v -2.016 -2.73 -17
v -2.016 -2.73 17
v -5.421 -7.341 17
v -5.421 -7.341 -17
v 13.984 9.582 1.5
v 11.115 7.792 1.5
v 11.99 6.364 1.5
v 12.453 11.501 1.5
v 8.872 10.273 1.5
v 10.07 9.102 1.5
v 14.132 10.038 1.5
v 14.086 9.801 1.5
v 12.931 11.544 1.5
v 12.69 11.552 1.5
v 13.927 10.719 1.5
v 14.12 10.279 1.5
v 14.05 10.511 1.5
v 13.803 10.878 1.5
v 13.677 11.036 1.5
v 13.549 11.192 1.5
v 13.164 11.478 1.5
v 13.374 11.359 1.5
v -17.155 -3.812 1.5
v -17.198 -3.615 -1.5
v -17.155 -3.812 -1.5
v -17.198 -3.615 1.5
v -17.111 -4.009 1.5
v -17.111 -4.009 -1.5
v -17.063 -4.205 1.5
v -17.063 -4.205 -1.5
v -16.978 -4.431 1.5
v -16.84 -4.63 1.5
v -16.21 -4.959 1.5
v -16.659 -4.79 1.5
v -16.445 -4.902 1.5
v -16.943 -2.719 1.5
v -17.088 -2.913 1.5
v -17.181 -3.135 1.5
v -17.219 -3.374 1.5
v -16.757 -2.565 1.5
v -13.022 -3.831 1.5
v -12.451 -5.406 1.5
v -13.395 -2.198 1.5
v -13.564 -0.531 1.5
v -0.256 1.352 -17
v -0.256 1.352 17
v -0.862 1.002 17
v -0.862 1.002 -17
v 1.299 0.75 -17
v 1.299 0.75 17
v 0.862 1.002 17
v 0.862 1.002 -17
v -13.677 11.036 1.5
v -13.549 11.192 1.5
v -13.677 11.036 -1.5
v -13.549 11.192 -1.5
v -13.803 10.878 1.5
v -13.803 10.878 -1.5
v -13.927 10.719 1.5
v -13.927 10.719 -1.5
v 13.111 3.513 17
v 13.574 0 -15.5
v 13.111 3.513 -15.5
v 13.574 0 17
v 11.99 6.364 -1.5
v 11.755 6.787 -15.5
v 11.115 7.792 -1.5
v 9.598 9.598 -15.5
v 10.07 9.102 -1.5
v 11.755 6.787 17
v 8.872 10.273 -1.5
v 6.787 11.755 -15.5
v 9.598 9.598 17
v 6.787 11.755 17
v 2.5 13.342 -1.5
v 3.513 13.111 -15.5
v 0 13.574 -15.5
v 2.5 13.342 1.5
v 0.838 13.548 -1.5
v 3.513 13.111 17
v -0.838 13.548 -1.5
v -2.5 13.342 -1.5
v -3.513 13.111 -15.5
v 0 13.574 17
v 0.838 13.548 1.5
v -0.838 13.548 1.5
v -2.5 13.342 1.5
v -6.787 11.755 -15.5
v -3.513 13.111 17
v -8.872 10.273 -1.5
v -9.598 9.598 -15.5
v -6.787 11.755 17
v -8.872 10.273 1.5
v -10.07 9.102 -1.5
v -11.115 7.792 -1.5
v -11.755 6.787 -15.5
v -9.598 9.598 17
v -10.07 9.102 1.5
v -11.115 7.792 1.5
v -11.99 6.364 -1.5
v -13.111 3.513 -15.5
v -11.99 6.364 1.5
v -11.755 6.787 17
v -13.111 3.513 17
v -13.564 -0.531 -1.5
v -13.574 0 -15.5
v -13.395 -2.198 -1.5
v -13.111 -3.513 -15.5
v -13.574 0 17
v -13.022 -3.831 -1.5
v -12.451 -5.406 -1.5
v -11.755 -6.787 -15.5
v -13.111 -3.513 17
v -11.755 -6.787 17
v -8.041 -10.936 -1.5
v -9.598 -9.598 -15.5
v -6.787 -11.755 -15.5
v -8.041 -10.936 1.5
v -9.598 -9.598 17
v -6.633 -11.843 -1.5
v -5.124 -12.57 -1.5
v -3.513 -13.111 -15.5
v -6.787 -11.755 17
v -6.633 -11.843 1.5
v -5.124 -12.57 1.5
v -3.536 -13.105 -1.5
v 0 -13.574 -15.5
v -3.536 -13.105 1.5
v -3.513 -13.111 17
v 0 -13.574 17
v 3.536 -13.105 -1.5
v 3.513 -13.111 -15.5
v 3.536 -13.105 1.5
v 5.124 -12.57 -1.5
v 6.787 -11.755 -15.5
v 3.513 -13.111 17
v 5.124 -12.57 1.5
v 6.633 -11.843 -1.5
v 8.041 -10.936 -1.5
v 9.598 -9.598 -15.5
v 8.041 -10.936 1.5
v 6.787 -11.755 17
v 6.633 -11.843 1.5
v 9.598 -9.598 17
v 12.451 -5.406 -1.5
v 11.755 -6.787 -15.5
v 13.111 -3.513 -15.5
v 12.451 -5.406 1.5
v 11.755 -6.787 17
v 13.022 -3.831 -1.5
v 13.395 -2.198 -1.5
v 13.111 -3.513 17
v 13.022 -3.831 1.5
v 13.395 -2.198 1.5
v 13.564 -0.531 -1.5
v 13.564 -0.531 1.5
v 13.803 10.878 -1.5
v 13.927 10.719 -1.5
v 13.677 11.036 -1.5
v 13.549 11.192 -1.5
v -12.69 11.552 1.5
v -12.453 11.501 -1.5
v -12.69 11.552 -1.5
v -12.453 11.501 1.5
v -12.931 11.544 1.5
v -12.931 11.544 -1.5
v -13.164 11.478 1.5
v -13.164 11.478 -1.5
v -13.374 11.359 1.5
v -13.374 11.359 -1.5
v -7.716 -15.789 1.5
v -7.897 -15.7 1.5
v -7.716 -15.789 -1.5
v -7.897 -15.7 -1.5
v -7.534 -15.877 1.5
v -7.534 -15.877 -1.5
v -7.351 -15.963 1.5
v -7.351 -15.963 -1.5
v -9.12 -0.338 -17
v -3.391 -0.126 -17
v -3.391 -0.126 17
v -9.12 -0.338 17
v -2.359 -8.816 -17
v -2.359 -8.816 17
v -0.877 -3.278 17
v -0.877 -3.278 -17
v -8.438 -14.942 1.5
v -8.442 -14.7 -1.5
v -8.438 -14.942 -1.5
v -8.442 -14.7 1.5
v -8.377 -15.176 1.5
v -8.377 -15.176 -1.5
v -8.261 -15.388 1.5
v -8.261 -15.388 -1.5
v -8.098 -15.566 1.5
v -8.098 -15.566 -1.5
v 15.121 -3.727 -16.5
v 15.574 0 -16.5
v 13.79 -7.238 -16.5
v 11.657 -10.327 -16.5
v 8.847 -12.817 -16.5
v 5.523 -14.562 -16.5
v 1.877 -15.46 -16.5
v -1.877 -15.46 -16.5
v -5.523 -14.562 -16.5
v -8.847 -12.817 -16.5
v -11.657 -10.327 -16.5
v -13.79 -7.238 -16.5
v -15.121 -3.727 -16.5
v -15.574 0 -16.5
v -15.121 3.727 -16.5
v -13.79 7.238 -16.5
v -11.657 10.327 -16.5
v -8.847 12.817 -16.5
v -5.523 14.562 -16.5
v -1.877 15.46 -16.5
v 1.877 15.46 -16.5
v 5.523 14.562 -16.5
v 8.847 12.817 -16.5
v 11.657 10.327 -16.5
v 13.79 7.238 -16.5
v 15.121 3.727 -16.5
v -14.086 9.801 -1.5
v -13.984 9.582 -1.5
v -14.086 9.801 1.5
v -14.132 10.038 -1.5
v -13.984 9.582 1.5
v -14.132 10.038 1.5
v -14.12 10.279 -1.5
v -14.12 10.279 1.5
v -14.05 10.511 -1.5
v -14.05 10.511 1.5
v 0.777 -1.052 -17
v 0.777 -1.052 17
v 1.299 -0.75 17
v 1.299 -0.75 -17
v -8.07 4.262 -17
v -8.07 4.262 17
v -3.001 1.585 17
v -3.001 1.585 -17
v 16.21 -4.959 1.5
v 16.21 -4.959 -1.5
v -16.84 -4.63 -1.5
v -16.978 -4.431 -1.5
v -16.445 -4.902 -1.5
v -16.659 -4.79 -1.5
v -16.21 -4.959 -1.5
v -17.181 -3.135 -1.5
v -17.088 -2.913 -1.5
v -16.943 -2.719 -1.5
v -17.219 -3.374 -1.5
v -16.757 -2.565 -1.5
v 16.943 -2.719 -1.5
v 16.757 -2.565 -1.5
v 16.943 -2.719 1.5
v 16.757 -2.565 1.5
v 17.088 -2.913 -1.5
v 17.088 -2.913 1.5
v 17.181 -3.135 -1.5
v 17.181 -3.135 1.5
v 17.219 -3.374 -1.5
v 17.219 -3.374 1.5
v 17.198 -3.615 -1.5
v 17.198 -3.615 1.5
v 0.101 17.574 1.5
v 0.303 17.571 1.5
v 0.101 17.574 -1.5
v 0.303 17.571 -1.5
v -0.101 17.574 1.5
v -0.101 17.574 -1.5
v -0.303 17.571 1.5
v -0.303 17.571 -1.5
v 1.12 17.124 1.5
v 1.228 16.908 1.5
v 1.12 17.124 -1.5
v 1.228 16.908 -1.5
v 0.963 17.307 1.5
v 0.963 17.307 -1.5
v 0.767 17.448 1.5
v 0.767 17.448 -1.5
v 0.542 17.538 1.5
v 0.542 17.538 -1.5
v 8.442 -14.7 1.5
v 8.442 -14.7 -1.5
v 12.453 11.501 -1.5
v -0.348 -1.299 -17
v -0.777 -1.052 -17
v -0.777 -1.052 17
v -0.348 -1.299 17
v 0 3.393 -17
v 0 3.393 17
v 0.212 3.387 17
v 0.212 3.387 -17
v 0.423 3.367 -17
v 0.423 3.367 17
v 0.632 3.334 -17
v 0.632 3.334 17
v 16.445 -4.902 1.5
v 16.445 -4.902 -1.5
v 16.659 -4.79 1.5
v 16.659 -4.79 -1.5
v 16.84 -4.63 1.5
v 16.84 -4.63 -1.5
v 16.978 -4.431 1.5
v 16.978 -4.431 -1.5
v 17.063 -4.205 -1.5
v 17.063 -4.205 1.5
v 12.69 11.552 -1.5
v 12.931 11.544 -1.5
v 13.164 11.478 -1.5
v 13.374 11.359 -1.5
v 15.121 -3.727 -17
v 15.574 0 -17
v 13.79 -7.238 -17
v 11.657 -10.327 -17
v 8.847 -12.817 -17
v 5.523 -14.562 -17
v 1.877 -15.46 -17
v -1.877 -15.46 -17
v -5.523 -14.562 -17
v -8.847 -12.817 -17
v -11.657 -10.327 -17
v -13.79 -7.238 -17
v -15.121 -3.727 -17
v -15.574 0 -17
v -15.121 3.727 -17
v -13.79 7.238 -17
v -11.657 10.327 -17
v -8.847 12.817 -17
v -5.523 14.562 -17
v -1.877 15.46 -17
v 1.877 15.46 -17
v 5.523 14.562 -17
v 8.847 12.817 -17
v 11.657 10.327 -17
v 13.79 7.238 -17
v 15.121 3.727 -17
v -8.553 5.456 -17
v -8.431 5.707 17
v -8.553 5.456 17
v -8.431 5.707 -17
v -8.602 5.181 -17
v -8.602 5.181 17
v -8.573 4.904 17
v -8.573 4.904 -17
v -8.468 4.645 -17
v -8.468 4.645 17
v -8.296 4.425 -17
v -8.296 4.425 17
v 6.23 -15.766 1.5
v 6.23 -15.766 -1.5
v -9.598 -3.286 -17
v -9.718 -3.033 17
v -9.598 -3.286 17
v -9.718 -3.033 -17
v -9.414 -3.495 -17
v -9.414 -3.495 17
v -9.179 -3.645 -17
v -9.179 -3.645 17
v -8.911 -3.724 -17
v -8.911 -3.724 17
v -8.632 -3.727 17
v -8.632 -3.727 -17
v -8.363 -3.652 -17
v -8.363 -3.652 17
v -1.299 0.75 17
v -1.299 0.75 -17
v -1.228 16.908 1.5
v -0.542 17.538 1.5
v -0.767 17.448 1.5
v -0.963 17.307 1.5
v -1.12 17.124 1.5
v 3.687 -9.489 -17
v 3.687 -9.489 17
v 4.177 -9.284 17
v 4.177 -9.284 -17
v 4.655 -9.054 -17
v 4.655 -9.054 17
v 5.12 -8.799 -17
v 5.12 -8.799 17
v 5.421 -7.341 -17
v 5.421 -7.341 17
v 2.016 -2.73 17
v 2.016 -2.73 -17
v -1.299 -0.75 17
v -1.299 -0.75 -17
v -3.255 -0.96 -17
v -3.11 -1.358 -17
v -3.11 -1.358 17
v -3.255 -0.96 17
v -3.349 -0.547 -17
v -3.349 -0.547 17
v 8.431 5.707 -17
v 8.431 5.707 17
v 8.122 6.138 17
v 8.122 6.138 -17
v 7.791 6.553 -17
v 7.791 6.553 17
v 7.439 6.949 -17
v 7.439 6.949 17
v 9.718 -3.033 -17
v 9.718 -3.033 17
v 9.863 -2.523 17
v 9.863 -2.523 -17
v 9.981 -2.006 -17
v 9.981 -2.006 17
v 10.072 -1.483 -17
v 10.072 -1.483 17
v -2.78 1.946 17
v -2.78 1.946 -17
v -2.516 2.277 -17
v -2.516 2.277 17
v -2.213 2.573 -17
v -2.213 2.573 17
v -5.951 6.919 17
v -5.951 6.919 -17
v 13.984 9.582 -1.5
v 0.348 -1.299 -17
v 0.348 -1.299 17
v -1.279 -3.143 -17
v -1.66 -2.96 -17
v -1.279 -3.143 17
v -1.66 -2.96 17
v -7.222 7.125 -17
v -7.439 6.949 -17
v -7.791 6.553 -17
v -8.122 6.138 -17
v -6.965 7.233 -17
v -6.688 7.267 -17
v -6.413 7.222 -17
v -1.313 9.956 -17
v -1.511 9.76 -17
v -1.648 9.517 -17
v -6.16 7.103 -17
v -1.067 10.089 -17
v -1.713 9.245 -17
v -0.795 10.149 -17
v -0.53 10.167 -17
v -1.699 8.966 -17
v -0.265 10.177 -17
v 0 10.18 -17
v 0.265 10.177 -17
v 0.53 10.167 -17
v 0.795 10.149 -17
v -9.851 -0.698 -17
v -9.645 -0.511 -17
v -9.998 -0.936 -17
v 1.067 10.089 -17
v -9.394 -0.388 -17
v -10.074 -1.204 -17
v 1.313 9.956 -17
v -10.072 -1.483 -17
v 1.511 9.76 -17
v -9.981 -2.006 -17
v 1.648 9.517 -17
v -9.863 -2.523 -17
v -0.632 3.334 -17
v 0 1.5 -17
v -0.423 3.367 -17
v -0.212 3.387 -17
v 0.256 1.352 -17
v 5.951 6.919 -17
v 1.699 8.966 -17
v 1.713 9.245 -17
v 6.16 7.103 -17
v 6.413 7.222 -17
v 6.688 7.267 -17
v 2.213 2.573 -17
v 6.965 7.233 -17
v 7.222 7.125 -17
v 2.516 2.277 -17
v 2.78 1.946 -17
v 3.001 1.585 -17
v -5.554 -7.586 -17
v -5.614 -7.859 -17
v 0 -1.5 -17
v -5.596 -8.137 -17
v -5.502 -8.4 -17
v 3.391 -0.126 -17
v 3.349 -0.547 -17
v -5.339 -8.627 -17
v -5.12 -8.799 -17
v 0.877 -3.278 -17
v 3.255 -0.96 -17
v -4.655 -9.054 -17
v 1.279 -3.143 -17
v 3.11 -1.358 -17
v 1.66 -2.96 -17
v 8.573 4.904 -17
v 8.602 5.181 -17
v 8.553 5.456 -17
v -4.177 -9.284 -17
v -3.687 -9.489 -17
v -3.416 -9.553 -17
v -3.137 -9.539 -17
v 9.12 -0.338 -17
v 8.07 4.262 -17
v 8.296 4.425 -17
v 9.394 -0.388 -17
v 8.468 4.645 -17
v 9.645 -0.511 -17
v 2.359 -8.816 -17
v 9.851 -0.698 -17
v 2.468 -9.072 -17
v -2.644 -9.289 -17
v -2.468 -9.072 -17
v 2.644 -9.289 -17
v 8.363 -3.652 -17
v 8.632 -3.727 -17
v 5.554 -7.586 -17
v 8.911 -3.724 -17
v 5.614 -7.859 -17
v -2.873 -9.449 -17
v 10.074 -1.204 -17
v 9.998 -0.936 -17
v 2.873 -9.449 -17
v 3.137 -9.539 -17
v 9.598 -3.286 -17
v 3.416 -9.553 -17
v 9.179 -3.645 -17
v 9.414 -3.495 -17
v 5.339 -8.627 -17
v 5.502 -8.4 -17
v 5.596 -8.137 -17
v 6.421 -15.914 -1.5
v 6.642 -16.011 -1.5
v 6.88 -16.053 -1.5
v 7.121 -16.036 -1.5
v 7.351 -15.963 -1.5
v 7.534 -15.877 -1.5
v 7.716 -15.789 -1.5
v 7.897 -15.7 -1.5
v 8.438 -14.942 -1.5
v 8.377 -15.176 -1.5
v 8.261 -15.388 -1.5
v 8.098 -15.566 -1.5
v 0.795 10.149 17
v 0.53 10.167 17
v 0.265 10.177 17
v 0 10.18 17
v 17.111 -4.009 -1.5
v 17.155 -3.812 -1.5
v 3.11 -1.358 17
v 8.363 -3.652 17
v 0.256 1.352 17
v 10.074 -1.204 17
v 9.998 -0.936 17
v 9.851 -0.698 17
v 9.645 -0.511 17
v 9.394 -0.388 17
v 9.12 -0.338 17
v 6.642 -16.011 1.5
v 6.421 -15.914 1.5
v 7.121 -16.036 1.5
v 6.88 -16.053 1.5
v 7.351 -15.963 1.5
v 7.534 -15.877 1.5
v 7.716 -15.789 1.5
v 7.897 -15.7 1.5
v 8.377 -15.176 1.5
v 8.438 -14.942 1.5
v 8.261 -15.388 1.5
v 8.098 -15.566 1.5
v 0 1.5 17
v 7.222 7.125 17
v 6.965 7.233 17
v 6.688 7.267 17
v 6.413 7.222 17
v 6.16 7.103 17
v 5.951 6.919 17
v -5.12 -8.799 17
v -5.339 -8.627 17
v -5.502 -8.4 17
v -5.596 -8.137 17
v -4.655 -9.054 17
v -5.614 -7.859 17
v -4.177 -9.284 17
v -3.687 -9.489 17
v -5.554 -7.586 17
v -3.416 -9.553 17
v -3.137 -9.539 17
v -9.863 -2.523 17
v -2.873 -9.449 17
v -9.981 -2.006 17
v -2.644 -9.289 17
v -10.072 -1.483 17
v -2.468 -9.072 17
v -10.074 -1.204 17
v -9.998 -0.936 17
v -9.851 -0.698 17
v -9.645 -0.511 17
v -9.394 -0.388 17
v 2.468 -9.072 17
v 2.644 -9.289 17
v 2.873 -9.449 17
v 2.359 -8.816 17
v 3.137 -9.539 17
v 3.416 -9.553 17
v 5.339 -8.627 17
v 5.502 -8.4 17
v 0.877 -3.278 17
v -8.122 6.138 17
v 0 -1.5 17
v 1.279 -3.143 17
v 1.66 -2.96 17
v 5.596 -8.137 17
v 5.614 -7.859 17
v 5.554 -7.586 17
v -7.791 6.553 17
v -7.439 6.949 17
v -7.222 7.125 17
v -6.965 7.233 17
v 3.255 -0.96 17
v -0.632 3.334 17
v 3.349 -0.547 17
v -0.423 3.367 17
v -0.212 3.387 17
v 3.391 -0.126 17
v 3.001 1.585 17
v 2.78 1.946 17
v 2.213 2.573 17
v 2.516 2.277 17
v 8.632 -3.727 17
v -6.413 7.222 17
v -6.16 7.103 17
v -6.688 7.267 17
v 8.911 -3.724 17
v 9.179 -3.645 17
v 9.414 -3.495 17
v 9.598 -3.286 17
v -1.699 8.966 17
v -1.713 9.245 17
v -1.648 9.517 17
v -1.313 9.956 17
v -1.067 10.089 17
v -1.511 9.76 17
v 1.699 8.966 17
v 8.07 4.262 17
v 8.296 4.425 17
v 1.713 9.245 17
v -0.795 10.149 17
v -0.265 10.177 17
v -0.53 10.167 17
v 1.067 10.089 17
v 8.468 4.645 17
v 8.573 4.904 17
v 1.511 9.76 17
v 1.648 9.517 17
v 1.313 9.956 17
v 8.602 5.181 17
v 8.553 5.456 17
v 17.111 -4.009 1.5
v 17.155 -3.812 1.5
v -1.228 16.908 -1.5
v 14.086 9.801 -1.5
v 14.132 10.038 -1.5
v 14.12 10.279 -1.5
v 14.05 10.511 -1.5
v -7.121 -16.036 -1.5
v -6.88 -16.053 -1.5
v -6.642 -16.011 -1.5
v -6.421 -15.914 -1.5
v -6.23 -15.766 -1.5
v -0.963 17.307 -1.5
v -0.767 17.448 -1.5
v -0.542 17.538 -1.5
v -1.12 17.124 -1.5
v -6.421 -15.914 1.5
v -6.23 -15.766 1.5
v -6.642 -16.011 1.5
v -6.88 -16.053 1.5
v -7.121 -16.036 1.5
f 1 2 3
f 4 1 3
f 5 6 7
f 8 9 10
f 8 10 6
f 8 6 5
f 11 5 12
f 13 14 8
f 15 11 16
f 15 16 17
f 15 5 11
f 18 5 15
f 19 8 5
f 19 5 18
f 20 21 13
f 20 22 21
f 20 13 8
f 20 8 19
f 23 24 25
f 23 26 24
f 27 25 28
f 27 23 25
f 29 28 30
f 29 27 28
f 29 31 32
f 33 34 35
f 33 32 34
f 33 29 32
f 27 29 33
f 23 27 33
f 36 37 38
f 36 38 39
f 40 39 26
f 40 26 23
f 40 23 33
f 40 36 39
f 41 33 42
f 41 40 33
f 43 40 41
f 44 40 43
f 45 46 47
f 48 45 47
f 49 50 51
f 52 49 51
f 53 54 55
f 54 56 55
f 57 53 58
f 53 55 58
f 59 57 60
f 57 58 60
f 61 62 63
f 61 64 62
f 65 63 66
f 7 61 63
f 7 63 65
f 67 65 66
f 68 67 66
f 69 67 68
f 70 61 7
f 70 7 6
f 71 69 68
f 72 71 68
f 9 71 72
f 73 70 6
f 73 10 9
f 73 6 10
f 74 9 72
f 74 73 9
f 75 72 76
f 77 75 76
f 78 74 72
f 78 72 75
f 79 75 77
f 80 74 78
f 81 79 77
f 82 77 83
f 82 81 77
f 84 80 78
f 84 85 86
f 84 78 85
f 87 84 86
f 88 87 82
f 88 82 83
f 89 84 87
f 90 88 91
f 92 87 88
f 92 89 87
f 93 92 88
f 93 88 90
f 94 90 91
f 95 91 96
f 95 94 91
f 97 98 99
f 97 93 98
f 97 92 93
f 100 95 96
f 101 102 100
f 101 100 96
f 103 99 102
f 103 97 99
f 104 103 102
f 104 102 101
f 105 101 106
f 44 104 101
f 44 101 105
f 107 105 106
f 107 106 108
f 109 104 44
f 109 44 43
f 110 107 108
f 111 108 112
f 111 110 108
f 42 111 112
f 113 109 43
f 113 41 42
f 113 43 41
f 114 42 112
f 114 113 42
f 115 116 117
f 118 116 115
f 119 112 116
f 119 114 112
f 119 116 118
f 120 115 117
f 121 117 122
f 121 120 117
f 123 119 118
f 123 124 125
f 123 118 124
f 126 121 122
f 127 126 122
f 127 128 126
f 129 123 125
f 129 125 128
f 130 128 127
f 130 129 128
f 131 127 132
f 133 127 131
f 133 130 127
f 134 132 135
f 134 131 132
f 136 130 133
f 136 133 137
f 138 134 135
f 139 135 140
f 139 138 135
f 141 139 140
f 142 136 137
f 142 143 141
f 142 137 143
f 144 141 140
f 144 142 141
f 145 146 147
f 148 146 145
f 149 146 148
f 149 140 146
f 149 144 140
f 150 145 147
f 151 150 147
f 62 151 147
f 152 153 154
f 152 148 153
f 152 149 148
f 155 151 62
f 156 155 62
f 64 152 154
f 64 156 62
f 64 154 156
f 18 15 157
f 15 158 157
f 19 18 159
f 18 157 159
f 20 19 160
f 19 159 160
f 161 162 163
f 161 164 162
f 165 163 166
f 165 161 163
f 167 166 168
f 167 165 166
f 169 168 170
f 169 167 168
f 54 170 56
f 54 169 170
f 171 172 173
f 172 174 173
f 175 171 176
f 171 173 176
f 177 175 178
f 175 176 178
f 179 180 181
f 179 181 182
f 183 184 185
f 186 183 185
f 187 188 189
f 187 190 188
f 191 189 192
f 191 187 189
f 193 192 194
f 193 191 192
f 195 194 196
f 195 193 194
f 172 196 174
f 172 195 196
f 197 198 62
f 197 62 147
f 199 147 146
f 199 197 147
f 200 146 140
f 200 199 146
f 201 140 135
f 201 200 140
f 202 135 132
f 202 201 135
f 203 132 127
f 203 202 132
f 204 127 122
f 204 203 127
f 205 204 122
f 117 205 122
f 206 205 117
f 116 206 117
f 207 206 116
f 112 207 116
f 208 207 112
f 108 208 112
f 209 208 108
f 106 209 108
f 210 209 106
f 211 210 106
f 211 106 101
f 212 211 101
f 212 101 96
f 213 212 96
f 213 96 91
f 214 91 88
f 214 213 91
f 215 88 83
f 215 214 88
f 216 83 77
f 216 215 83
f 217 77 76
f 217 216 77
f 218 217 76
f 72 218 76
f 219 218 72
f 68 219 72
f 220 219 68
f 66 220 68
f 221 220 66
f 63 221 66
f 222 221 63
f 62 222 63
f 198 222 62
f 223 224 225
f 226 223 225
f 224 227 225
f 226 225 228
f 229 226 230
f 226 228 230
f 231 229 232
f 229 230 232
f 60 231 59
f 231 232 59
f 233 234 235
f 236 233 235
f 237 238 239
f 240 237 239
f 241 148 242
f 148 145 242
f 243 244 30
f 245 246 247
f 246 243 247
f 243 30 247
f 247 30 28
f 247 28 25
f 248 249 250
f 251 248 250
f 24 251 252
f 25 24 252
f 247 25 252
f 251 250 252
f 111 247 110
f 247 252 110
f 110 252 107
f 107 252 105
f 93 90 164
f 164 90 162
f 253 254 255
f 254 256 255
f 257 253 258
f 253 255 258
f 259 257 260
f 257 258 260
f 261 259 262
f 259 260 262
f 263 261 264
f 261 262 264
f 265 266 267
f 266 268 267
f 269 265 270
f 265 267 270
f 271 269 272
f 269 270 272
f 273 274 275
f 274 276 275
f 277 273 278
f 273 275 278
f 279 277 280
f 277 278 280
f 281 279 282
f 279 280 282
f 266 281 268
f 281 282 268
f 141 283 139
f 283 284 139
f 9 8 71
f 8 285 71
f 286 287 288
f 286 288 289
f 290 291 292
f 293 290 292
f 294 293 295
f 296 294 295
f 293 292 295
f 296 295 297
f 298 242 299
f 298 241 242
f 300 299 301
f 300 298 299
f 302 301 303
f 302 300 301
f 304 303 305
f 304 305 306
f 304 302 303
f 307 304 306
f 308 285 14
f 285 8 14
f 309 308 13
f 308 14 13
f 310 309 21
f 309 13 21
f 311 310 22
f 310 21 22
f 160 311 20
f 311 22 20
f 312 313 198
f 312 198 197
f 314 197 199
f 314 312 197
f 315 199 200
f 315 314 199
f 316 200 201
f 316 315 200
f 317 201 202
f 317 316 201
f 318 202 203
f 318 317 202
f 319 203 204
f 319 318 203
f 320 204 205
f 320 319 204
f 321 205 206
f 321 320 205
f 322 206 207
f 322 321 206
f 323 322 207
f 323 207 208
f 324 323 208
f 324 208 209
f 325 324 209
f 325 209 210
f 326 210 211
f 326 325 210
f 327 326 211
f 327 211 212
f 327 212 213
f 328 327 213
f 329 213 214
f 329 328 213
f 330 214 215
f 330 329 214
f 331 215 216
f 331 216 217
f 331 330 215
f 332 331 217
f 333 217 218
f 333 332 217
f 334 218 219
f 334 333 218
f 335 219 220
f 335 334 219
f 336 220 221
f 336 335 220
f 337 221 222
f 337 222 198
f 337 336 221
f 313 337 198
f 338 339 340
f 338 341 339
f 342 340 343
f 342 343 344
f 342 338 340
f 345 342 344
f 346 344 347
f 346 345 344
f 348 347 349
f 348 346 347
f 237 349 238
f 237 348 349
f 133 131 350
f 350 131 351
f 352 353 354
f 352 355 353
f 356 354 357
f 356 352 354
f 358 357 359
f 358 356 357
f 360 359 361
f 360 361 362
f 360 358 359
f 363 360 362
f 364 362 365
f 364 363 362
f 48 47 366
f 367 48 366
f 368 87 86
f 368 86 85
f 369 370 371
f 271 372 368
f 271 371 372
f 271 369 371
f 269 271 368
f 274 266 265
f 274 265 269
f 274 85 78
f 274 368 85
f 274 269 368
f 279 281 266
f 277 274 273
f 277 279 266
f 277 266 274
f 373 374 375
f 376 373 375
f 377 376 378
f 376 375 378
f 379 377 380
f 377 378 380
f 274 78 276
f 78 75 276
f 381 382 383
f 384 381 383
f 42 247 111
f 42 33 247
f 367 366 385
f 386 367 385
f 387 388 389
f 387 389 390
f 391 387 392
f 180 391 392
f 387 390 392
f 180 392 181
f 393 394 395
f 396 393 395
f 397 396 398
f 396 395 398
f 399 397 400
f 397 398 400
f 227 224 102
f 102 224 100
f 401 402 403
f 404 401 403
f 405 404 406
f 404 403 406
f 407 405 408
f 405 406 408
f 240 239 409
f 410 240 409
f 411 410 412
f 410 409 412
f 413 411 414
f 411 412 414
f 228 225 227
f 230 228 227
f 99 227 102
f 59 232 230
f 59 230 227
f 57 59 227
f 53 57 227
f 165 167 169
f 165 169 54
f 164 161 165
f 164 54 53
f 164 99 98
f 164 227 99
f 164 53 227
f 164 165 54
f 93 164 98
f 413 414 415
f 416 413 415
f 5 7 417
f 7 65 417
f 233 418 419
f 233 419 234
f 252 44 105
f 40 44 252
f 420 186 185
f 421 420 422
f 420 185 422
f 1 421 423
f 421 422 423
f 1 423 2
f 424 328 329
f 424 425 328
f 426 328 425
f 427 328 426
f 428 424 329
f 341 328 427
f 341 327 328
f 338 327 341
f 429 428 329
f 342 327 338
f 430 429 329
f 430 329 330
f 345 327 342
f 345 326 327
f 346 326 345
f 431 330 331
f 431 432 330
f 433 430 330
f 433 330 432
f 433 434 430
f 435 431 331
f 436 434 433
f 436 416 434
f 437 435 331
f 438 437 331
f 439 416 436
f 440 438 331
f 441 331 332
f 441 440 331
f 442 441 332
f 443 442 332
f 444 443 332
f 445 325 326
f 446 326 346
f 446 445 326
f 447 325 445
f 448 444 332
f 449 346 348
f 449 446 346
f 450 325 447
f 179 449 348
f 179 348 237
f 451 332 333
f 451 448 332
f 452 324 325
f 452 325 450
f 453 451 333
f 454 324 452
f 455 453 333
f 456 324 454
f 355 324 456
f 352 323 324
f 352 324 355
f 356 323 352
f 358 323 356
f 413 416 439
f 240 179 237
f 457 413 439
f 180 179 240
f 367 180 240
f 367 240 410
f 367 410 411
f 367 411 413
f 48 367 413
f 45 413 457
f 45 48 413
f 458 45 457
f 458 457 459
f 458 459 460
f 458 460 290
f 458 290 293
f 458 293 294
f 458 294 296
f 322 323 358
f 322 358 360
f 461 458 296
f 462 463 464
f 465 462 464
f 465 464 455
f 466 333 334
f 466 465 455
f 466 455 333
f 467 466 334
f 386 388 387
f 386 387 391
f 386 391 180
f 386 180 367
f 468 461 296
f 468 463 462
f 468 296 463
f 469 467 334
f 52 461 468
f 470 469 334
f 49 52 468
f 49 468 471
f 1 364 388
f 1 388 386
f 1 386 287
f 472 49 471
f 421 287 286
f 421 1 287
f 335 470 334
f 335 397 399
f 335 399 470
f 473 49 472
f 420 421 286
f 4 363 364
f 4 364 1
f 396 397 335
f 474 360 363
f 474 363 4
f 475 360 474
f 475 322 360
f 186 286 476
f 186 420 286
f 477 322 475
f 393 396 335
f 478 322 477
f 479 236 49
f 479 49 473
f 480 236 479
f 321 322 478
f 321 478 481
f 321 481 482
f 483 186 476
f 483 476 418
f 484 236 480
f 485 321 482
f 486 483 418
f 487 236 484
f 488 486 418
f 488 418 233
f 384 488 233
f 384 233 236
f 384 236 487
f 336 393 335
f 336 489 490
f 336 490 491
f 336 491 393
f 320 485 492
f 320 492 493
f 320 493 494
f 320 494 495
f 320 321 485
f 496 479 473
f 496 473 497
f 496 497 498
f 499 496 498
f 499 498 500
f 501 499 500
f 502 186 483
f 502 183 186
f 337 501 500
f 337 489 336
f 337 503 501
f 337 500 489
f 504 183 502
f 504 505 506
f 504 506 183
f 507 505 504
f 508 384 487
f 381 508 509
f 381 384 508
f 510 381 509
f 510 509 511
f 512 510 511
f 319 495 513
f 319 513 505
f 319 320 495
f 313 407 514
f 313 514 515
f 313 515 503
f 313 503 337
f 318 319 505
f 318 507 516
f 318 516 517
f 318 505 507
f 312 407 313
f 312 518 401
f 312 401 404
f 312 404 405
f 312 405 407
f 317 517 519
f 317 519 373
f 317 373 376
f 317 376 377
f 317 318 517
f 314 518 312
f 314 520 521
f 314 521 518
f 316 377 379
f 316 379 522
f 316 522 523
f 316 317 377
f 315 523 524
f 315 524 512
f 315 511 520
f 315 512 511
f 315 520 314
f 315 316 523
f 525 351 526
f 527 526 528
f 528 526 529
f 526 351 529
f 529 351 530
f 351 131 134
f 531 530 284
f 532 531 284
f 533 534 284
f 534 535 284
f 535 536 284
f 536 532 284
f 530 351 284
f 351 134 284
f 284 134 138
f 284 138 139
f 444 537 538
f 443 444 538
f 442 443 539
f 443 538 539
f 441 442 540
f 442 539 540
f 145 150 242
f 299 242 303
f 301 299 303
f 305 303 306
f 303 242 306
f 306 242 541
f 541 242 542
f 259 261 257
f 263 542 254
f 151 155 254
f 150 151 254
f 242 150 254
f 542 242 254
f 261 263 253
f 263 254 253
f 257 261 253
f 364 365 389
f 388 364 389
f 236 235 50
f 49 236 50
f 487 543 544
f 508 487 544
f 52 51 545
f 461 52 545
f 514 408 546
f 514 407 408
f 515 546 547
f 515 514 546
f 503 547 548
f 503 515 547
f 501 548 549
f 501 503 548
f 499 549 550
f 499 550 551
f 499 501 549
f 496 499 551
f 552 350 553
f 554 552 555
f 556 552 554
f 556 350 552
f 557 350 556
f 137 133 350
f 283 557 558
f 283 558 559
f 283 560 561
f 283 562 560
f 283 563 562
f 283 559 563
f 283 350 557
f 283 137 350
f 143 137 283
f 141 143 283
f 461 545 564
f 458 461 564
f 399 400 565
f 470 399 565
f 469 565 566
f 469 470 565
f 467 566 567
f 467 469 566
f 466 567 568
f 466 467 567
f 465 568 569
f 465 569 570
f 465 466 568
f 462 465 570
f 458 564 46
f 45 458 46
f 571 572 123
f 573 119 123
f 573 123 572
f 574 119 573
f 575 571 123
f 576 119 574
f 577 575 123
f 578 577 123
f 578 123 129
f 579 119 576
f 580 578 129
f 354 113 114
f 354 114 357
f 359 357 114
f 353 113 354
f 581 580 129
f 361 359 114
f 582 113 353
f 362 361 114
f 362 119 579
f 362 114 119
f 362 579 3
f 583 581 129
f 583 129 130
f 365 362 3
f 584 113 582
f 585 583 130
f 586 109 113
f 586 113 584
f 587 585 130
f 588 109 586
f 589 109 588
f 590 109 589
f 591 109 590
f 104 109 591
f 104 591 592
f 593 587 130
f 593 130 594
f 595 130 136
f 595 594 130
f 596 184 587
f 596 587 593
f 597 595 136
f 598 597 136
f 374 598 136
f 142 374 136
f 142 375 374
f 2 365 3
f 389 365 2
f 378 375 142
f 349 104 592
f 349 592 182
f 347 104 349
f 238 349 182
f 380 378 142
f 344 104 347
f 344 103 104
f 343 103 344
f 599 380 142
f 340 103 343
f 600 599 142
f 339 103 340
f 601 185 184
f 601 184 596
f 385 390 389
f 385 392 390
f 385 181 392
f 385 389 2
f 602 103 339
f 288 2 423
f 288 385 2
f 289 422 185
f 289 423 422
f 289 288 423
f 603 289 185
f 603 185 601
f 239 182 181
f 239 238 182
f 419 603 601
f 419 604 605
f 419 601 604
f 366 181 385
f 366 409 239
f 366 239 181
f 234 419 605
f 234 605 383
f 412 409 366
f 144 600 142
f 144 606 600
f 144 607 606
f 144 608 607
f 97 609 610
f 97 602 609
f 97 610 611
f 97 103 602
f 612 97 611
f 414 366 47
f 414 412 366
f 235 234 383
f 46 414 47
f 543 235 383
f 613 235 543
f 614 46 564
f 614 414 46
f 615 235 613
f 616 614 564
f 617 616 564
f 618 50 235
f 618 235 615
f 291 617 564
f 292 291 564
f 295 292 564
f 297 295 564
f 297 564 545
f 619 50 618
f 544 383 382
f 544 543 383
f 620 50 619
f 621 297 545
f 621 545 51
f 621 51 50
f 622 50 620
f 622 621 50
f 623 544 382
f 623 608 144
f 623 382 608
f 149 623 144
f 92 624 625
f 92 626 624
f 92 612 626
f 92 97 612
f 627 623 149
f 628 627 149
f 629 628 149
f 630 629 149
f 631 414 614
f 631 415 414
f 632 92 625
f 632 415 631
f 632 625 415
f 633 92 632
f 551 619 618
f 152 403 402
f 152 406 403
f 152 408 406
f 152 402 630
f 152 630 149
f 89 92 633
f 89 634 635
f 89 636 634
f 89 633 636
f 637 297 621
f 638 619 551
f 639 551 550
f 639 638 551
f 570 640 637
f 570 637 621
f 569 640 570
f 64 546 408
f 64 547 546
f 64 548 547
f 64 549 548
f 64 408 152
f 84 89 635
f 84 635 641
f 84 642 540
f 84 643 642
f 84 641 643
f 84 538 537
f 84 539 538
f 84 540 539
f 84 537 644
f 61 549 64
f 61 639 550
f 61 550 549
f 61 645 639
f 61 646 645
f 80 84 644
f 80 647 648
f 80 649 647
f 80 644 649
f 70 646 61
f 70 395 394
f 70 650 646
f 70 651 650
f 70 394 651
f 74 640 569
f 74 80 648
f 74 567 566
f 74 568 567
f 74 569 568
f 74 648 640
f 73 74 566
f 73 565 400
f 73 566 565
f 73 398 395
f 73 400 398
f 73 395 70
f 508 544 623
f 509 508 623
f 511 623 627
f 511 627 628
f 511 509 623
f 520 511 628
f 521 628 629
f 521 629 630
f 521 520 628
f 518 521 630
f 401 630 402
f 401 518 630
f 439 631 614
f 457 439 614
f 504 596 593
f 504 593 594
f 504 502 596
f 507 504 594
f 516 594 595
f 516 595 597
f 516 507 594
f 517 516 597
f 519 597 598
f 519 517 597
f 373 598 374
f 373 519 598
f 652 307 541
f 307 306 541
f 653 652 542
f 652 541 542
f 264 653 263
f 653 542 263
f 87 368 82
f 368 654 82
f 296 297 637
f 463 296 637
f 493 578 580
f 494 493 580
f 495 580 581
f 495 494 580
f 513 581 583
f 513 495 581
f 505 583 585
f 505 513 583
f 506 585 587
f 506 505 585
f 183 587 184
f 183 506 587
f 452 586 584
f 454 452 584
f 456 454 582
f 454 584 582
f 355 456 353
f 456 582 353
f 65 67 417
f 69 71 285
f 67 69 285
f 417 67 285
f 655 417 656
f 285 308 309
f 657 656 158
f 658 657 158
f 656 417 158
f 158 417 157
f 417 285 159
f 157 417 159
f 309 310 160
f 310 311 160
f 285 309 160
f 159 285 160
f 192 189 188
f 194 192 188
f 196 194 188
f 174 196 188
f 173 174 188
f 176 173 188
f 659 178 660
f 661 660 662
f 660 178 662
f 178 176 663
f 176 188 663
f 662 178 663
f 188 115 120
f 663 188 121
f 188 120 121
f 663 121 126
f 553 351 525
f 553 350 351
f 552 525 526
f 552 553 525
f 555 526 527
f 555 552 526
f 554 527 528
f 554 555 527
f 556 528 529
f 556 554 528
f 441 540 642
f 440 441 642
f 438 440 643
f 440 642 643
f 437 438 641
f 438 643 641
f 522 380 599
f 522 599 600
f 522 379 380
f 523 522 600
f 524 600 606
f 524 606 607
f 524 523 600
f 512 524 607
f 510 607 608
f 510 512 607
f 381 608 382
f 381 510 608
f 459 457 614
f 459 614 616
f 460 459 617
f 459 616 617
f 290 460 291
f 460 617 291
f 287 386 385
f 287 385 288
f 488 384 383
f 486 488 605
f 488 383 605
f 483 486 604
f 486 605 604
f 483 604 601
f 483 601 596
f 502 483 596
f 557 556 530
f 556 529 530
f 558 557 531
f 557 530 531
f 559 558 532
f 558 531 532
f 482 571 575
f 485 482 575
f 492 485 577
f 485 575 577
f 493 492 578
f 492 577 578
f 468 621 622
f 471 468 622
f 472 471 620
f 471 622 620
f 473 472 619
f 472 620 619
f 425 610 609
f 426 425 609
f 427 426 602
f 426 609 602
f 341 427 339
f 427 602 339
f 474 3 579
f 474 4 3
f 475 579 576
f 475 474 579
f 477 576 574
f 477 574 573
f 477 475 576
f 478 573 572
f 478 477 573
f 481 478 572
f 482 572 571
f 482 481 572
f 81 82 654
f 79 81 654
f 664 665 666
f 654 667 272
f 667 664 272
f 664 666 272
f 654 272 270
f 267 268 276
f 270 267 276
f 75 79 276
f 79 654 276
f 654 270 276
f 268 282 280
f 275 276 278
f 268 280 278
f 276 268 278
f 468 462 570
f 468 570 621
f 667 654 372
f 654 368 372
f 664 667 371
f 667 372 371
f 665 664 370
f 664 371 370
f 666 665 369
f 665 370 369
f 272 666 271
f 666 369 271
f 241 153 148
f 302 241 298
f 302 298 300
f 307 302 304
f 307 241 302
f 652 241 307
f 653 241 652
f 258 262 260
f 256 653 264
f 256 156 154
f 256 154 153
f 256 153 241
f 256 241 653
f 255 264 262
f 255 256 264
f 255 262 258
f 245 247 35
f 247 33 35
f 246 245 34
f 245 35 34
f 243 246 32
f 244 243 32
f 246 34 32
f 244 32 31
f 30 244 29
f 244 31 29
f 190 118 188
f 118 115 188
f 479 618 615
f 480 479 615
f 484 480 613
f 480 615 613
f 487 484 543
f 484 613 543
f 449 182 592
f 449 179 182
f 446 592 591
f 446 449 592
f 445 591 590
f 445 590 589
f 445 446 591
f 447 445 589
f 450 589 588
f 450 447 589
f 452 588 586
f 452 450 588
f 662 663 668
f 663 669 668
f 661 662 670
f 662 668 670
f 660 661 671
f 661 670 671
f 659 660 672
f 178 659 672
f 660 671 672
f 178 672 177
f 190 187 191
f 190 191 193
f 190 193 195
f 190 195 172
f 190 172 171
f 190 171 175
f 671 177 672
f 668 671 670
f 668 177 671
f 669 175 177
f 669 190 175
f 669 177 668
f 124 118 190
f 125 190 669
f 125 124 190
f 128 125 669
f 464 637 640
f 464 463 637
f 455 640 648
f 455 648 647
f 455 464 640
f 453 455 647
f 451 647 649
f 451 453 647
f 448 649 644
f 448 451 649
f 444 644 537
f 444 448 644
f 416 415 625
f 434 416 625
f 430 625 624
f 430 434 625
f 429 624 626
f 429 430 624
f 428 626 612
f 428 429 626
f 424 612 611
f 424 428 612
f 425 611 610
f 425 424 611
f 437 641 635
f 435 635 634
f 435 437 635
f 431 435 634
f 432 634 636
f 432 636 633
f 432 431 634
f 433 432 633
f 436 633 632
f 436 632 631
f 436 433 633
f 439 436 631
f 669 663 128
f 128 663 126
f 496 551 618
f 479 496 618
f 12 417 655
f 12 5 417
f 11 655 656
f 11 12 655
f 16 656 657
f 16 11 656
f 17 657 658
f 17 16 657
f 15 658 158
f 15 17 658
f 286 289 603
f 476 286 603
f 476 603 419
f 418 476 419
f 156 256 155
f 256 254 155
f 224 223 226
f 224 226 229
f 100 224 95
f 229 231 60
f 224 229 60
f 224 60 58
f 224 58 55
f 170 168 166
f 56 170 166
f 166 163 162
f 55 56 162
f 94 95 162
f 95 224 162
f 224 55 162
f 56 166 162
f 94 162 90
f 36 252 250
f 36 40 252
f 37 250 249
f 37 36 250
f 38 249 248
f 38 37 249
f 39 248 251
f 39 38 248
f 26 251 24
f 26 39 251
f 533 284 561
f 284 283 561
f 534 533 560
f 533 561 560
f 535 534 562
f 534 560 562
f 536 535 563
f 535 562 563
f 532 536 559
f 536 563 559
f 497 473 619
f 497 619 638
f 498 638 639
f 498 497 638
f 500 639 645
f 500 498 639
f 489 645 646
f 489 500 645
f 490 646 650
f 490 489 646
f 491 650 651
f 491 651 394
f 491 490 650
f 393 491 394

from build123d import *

# Parameters (mm, degrees)
F0_R     = 13.57391
F1_DEPTH = 17
F3_DEPTH = 1.5
F5_DEPTH = 34
F6_R     = 1
F7_R     = 15.57391
F7_R_2   = 13.57391
F8_DEPTH = 1.5
F9_SIZE2 = 0.99999
F9_SIZE  = 1.99999
F10_R    = 1


# Not quite as in the source:
# - a fillet or chamfer is up to 0.001 mm smaller than in the source, because OpenCascade refuses the exact size


with BuildPart() as f1:
    # F0 (on Top) → F1 (new body, symmetric)
    with BuildSketch(Plane.XY):
        Circle(F0_R)
    extrude(amount=F1_DEPTH, both=True)

    # F2 (on Top) → F3 (join, symmetric)
    with BuildSketch(Plane.XY):
        with BuildLine():
            Line((-8.8722387473, 10.27299432), (-13.094084175, 11.721231689))
            ThreePointArc((-13.094084175, 11.721231689), (-13.7398361081, 10.9571536638), (-14.3410637787, 10.1575687241))
            Line((-14.3410637787, 10.1575687241), (-11.9896877566, 6.3638369077))
            ThreePointArc((-11.9896877566, 6.3638369077), (-10.6125101782, 8.4631944563), (-8.8722387473, 10.27299432))
        make_face()
        with BuildLine():
            ThreePointArc((1, 17.5454356654), (0, 17.57391), (-1, 17.5454356654))
            Line((-1, 17.5454356654), (-2.5, 13.3417027657))
            ThreePointArc((-2.5, 13.3417027657), (0, 13.57391), (2.5, 13.3417027657))
            Line((2.5, 13.3417027657), (1, 17.5454356654))
        make_face()
        with BuildLine():
            Line((11.9896877566, 6.3638369077), (14.3410637787, 10.1575687241))
            ThreePointArc((14.3410637787, 10.1575687241), (13.7398361081, 10.9571536638), (13.094084175, 11.721231689))
            Line((13.094084175, 11.721231689), (8.8722387473, 10.27299432))
            ThreePointArc((8.8722387473, 10.27299432), (10.6125101782, 8.4631944563), (11.9896877566, 6.3638369077))
        make_face()
        with BuildLine():
            Line((12.4508960874, -5.4061279404), (16.8830140276, -4.8791546431))
            ThreePointArc((16.8830140276, -4.8791546431), (17.1332953852, -3.9105628665), (17.3280558955, -2.9292988187))
            Line((17.3280558955, -2.9292988187), (13.5635007572, -0.5314883795))
            ThreePointArc((13.5635007572, -0.5314883795), (13.2335837364, -3.0204791306), (12.4508960874, -5.4061279404))
        make_face()
        with BuildLine():
            Line((3.5363257124, -13.1051681845), (6.711710363, -16.2417750474))
            ThreePointArc((6.711710363, -16.2417750474), (7.6250337817, -15.8335457973), (8.5136480988, -15.3740075692))
            Line((8.5136480988, -15.3740075692), (8.0411700519, -10.9357494889))
            ThreePointArc((8.0411700519, -10.9357494889), (5.8894988252, -12.2296703257), (3.5363257124, -13.1051681845))
        make_face()
        with BuildLine():
            Line((-8.0411700519, -10.9357494889), (-8.5136480988, -15.3740075692))
            ThreePointArc((-8.5136480988, -15.3740075692), (-7.6250337817, -15.8335457973), (-6.711710363, -16.2417750474))
            Line((-6.711710363, -16.2417750474), (-3.5363257124, -13.1051681845))
            ThreePointArc((-3.5363257124, -13.1051681845), (-5.8894988252, -12.2296703257), (-8.0411700519, -10.9357494889))
        make_face()
        with BuildLine():
            Line((-13.5635007572, -0.5314883795), (-17.3280558955, -2.9292988187))
            ThreePointArc((-17.3280558955, -2.9292988187), (-17.1332953852, -3.9105628665), (-16.8830140276, -4.8791546431))
            Line((-16.8830140276, -4.8791546431), (-12.4508960874, -5.4061279404))
            ThreePointArc((-12.4508960874, -5.4061279404), (-13.2335837364, -3.0204791306), (-13.5635007572, -0.5314883795))
        make_face()
    extrude(amount=F3_DEPTH, both=True)

    # F4 (on face) → F5 (cut)
    with BuildSketch(Plane.XY.offset(17)):
        with BuildLine():
            ThreePointArc((-3.0007085232, 1.5847516846), (-2.6531275445, 2.1157986141), (-2.2127391143, 2.5728340707))
            Line((-2.2127391143, 2.5728340707), (-6.6382173429, 7.718502212))
            ThreePointArc((-6.6382173429, 7.718502212), (-7.9593826336, 6.3473958423), (-9.0021255696, 4.7542550537))
            Line((-9.0021255696, 4.7542550537), (-3.0007085232, 1.5847516846))
        make_face()
        with BuildLine():
            ThreePointArc((-0.6319024037, 3.334124907), (-0.3173418417, 3.3786067688), (0, 3.3934775))
            Line((0, 3.3934775), (0, 6.786955))
            Line((0, 6.786955), (0, 10.1804325))
            ThreePointArc((0, 10.1804325), (-0.9520255252, 10.1358203065), (-1.895707211, 10.0023747209))
            Line((-1.895707211, 10.0023747209), (-0.6319024037, 3.334124907))
        make_face()
        with BuildLine():
            Line((0, 6.786955), (0, 3.3934775))
            ThreePointArc((0, 3.3934775), (0.3173418417, 3.3786067688), (0.6319024037, 3.334124907))
            Line((0.6319024037, 3.334124907), (1.895707211, 10.0023747209))
            ThreePointArc((1.895707211, 10.0023747209), (0.9520255252, 10.1358203065), (0, 10.1804325))
            Line((0, 10.1804325), (0, 6.786955))
        make_face()
        with BuildLine():
            ThreePointArc((2.2127391143, 2.5728340707), (2.6531275445, 2.1157986141), (3.0007085232, 1.5847516846))
            Line((3.0007085232, 1.5847516846), (9.0021255696, 4.7542550537))
            ThreePointArc((9.0021255696, 4.7542550537), (7.9593826336, 6.3473958423), (6.6382173429, 7.718502212))
            Line((6.6382173429, 7.718502212), (2.2127391143, 2.5728340707))
        make_face()
        with BuildLine():
            ThreePointArc((3.3911429475, -0.1258532971), (3.3083959341, -0.7551197827), (3.1099199215, -1.3579718793))
            Line((3.1099199215, -1.3579718793), (9.3297597644, -4.073915638))
            ThreePointArc((9.3297597644, -4.073915638), (9.9251878023, -2.265359348), (10.1734288426, -0.3775598913))
            Line((10.1734288426, -0.3775598913), (3.3911429475, -0.1258532971))
        make_face()
        with BuildLine():
            ThreePointArc((2.0159469746, -2.7297705652), (1.4723747063, -3.0574175814), (0.8772981881, -3.2781149205))
            Line((0.8772981881, -3.2781149205), (2.6318945642, -9.8343447616))
            ThreePointArc((2.6318945642, -9.8343447616), (4.4171241189, -9.1722527443), (6.0478409237, -8.1893116956))
            Line((6.0478409237, -8.1893116956), (2.0159469746, -2.7297705652))
        make_face()
        with BuildLine():
            ThreePointArc((-0.8772981881, -3.2781149205), (-1.4723747063, -3.0574175814), (-2.0159469746, -2.7297705652))
            Line((-2.0159469746, -2.7297705652), (-6.0478409237, -8.1893116956))
            ThreePointArc((-6.0478409237, -8.1893116956), (-4.4171241189, -9.1722527443), (-2.6318945642, -9.8343447616))
            Line((-2.6318945642, -9.8343447616), (-0.8772981881, -3.2781149205))
        make_face()
        with BuildLine():
            ThreePointArc((-3.1099199215, -1.3579718793), (-3.3083959341, -0.7551197827), (-3.3911429475, -0.1258532971))
            Line((-3.3911429475, -0.1258532971), (-10.1734288426, -0.3775598913))
            ThreePointArc((-10.1734288426, -0.3775598913), (-9.9251878023, -2.265359348), (-9.3297597644, -4.073915638))
            Line((-9.3297597644, -4.073915638), (-3.1099199215, -1.3579718793))
        make_face()
        Polygon((-1.2990381057, 0.68605558), (0, 0), (-0.8620256343, 1.002309268), (-1.2990381057, 0.75), align=None)
        Polygon((-0.8620256343, 1.002309268), (0, 0), (-0.2562490973, 1.3520545147), align=None)
        Polygon((-0.2562490973, 1.3520545147), (0, 0), (0, 1.5), align=None)
        Polygon((0, 1.5), (0, 0), (0.2562490973, 1.3520545147), align=None)
        Polygon((0.2562490973, 1.3520545147), (0, 0), (0.8620256343, 1.002309268), align=None)
        Polygon((0.8620256343, 1.002309268), (0, 0), (1.2990381057, 0.68605558), (1.2990381057, 0.75), align=None)
        Polygon((1.2990381057, 0.68605558), (0, 0), (1.2990381057, -0.0482103619), align=None)
        Polygon((1.2990381057, -0.0482103619), (0, 0), (1.2990381057, -0.5672355759), align=None)
        Polygon((1.2990381057, -0.5672355759), (0, 0), (0.7766231283, -1.0516164278), (1.2990381057, -0.75), align=None)
        Polygon((0.7766231283, -1.0516164278), (0, 0), (0.3477089236, -1.2992501593), align=None)
        Polygon((0.3477089236, -1.2992501593), (0, 0), (-0.3477089236, -1.2992501593), (0, -1.5), align=None)
        Polygon((-0.3477089236, -1.2992501593), (0, 0), (-0.7766231283, -1.0516164278), align=None)
        Polygon((-0.7766231283, -1.0516164278), (0, 0), (-1.2990381057, -0.5672355759), (-1.2990381057, -0.75), align=None)
        Polygon((-1.2990381057, -0.5672355759), (0, 0), (-1.2990381057, -0.0482103619), align=None)
        Polygon((-1.2990381057, -0.0482103619), (0, 0), (-1.2990381057, 0.68605558), align=None)
    extrude(amount=-F5_DEPTH, mode=Mode.SUBTRACT)

    # F6
    f6_edges = [f1.edges().sort_by_distance(p)[0] for p in [
        (-6.047841, -8.189312, 0),
        (-2.631895, -9.834345, 0),
        (2.631895, -9.834345, 0),
        (6.047841, -8.189312, 0),
        (9.32976, -4.073916, 0),
        (-9.32976, -4.073916, 0),
        (-10.173429, -0.37756, 0),
        (-9.002126, 4.754255, 0),
        (-6.638217, 7.718502, 0),
        (6.638217, 7.718502, 0),
        (-1.895707, 10.002375, 0),
        (1.895707, 10.002375, 0),
        (9.002126, 4.754255, 0),
        (10.173429, -0.37756, 0),
    ]]
    fillet(f6_edges, radius=F6_R)

    # F7 (on face) → F8 (join)
    with BuildSketch(Plane(origin=(0, 0, -17), x_dir=(1, 0, 0), z_dir=(0, 0, -1))):
        Circle(F7_R)
        Circle(F7_R_2, mode=Mode.SUBTRACT)
    extrude(amount=-F8_DEPTH)

    # F9 (size 2 and 1 in the source; OpenCascade refuses exactly that, so slightly less here)
    f9_edges = [f1.edges().sort_by_distance(p)[0] for p in [
        (-15.57391, 0, -15.5),
    ]]
    f9_side = f1.faces().sort_by_distance((-15.133413, 0, -15.5))[0]
    chamfer(f9_edges, length=F9_SIZE, length2=F9_SIZE2, reference=f9_side)

    # F10
    f10_edges = [f1.edges().sort_by_distance(p)[0] for p in [
        (14.341064, 10.157569, 0),
        (13.094084, 11.721232, 0),
        (1, 17.545436, 0),
        (-1, 17.545436, 0),
        (-13.094084, 11.721232, 0),
        (-14.341064, 10.157569, 0),
        (-17.328056, -2.929299, 0),
        (-16.883014, -4.879155, 0),
        (-8.513648, -15.374008, 0),
        (-6.71171, -16.241775, 0),
        (6.71171, -16.241775, 0),
        (8.513648, -15.374008, 0),
        (16.883014, -4.879155, 0),
        (17.328056, -2.929299, 0),
    ]]
    fillet(f10_edges, radius=F10_R)


solid = f1.part
